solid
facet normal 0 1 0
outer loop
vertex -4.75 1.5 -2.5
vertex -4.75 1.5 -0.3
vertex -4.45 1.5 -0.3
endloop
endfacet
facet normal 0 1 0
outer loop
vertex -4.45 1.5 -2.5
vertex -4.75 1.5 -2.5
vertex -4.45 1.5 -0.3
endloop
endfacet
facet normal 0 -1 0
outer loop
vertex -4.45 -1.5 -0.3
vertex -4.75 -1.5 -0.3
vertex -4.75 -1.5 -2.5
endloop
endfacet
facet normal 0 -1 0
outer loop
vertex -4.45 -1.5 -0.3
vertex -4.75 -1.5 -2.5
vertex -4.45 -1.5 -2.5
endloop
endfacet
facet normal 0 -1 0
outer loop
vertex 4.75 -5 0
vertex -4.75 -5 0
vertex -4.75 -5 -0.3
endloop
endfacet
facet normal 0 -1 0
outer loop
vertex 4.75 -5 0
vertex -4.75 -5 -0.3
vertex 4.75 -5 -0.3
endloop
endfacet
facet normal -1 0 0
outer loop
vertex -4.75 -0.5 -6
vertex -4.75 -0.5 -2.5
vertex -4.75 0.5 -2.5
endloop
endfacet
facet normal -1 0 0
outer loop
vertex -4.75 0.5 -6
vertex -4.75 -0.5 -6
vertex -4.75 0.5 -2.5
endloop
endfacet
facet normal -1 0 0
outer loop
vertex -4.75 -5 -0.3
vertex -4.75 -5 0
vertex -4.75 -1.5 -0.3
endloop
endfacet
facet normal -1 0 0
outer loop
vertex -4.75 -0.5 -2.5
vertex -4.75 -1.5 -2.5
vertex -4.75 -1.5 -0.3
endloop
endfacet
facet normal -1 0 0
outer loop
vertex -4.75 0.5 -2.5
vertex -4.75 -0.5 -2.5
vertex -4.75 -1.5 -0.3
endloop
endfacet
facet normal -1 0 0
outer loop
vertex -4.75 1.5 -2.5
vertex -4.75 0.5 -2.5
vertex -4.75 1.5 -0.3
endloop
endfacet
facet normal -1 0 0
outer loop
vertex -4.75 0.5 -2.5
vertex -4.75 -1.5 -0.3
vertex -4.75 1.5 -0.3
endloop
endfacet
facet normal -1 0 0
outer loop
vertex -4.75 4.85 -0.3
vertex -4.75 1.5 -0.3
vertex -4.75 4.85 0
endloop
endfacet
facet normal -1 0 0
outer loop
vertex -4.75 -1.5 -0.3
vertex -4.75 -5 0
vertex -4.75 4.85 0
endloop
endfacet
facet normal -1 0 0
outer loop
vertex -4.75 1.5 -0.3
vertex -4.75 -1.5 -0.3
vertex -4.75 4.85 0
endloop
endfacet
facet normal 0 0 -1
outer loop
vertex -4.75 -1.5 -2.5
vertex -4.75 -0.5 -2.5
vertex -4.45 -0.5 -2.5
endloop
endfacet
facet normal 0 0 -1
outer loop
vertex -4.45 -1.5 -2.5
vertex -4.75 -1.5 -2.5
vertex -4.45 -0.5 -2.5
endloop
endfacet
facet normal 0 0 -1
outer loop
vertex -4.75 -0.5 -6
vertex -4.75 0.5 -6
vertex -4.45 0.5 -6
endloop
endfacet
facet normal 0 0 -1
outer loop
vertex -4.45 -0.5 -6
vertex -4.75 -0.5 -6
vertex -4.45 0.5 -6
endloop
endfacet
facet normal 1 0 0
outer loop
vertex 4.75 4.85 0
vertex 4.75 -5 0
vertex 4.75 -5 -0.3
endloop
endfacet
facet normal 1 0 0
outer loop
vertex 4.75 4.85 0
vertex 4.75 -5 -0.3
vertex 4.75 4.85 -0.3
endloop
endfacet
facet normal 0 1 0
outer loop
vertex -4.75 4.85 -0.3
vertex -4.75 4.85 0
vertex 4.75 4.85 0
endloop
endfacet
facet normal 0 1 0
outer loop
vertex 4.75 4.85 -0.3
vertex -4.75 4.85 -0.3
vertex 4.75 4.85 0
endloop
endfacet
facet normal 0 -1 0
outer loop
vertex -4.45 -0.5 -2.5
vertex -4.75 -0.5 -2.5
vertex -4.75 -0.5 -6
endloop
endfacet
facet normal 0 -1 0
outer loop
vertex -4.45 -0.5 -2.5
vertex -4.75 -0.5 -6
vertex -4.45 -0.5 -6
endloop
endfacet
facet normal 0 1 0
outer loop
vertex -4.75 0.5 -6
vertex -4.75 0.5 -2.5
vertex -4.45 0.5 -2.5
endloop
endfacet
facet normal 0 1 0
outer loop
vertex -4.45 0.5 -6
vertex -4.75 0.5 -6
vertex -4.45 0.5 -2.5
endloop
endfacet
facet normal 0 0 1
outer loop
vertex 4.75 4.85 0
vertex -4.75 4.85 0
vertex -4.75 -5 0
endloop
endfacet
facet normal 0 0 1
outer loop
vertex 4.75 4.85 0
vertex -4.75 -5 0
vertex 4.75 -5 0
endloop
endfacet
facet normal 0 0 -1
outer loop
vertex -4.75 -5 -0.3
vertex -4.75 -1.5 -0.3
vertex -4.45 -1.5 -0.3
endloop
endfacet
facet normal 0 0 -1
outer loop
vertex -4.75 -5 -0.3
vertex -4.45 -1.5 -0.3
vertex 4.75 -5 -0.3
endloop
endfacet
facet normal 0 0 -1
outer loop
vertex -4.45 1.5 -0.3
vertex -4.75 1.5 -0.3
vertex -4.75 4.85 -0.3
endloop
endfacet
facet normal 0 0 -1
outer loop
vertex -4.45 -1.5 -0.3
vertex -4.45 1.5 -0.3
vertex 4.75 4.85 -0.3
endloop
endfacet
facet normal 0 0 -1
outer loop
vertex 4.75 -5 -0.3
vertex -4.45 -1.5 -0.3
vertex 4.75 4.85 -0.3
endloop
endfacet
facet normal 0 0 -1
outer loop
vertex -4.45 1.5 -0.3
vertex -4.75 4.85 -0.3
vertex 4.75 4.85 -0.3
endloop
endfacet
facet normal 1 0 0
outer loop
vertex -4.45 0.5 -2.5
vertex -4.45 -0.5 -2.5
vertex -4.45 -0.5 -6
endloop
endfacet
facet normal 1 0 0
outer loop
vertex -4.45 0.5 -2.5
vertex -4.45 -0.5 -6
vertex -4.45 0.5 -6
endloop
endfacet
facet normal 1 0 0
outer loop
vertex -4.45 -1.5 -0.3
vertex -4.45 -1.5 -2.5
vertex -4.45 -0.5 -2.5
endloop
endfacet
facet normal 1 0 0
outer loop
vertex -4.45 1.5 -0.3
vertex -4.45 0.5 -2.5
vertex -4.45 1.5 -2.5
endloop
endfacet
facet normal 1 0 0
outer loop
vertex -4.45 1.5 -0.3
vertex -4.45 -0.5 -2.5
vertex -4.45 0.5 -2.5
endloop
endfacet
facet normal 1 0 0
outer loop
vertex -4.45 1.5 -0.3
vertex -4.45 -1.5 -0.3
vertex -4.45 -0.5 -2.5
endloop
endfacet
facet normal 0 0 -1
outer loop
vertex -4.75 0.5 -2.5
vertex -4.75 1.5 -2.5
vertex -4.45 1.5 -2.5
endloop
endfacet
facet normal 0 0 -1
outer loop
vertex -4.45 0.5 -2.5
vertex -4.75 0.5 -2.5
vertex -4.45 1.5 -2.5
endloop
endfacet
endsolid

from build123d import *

# Parameters (mm, degrees)
SKETCH014_W  = 9.5
SKETCH014_H  = 9.85
PAD007_DEPTH = 0.3
SKETCH015_W  = 0.3
SKETCH015_H  = 3
PAD008_DEPTH = 2.2
SKETCH016_W  = 0.3
SKETCH016_H  = 1
PAD009_DEPTH = 3.5


with BuildPart() as part:
    # Sketch014 → Pad007 (new body)
    with BuildSketch(Plane.XY):
        with Locations((0, -0.075)):
            Rectangle(SKETCH014_W, SKETCH014_H)
    extrude(amount=-PAD007_DEPTH)

    # Sketch015 → Pad008 (join)
    with BuildSketch(Plane.XY.offset(-0.3)):
        with Locations((-4.6, 0)):
            Rectangle(SKETCH015_W, SKETCH015_H)
    extrude(amount=-PAD008_DEPTH)

    # Sketch016 → Pad009 (join)
    with BuildSketch(Plane.XY.offset(-2.5)):
        with Locations((-4.6, 0)):
            Rectangle(SKETCH016_W, SKETCH016_H)
    extrude(amount=-PAD009_DEPTH)


solid = part.part
